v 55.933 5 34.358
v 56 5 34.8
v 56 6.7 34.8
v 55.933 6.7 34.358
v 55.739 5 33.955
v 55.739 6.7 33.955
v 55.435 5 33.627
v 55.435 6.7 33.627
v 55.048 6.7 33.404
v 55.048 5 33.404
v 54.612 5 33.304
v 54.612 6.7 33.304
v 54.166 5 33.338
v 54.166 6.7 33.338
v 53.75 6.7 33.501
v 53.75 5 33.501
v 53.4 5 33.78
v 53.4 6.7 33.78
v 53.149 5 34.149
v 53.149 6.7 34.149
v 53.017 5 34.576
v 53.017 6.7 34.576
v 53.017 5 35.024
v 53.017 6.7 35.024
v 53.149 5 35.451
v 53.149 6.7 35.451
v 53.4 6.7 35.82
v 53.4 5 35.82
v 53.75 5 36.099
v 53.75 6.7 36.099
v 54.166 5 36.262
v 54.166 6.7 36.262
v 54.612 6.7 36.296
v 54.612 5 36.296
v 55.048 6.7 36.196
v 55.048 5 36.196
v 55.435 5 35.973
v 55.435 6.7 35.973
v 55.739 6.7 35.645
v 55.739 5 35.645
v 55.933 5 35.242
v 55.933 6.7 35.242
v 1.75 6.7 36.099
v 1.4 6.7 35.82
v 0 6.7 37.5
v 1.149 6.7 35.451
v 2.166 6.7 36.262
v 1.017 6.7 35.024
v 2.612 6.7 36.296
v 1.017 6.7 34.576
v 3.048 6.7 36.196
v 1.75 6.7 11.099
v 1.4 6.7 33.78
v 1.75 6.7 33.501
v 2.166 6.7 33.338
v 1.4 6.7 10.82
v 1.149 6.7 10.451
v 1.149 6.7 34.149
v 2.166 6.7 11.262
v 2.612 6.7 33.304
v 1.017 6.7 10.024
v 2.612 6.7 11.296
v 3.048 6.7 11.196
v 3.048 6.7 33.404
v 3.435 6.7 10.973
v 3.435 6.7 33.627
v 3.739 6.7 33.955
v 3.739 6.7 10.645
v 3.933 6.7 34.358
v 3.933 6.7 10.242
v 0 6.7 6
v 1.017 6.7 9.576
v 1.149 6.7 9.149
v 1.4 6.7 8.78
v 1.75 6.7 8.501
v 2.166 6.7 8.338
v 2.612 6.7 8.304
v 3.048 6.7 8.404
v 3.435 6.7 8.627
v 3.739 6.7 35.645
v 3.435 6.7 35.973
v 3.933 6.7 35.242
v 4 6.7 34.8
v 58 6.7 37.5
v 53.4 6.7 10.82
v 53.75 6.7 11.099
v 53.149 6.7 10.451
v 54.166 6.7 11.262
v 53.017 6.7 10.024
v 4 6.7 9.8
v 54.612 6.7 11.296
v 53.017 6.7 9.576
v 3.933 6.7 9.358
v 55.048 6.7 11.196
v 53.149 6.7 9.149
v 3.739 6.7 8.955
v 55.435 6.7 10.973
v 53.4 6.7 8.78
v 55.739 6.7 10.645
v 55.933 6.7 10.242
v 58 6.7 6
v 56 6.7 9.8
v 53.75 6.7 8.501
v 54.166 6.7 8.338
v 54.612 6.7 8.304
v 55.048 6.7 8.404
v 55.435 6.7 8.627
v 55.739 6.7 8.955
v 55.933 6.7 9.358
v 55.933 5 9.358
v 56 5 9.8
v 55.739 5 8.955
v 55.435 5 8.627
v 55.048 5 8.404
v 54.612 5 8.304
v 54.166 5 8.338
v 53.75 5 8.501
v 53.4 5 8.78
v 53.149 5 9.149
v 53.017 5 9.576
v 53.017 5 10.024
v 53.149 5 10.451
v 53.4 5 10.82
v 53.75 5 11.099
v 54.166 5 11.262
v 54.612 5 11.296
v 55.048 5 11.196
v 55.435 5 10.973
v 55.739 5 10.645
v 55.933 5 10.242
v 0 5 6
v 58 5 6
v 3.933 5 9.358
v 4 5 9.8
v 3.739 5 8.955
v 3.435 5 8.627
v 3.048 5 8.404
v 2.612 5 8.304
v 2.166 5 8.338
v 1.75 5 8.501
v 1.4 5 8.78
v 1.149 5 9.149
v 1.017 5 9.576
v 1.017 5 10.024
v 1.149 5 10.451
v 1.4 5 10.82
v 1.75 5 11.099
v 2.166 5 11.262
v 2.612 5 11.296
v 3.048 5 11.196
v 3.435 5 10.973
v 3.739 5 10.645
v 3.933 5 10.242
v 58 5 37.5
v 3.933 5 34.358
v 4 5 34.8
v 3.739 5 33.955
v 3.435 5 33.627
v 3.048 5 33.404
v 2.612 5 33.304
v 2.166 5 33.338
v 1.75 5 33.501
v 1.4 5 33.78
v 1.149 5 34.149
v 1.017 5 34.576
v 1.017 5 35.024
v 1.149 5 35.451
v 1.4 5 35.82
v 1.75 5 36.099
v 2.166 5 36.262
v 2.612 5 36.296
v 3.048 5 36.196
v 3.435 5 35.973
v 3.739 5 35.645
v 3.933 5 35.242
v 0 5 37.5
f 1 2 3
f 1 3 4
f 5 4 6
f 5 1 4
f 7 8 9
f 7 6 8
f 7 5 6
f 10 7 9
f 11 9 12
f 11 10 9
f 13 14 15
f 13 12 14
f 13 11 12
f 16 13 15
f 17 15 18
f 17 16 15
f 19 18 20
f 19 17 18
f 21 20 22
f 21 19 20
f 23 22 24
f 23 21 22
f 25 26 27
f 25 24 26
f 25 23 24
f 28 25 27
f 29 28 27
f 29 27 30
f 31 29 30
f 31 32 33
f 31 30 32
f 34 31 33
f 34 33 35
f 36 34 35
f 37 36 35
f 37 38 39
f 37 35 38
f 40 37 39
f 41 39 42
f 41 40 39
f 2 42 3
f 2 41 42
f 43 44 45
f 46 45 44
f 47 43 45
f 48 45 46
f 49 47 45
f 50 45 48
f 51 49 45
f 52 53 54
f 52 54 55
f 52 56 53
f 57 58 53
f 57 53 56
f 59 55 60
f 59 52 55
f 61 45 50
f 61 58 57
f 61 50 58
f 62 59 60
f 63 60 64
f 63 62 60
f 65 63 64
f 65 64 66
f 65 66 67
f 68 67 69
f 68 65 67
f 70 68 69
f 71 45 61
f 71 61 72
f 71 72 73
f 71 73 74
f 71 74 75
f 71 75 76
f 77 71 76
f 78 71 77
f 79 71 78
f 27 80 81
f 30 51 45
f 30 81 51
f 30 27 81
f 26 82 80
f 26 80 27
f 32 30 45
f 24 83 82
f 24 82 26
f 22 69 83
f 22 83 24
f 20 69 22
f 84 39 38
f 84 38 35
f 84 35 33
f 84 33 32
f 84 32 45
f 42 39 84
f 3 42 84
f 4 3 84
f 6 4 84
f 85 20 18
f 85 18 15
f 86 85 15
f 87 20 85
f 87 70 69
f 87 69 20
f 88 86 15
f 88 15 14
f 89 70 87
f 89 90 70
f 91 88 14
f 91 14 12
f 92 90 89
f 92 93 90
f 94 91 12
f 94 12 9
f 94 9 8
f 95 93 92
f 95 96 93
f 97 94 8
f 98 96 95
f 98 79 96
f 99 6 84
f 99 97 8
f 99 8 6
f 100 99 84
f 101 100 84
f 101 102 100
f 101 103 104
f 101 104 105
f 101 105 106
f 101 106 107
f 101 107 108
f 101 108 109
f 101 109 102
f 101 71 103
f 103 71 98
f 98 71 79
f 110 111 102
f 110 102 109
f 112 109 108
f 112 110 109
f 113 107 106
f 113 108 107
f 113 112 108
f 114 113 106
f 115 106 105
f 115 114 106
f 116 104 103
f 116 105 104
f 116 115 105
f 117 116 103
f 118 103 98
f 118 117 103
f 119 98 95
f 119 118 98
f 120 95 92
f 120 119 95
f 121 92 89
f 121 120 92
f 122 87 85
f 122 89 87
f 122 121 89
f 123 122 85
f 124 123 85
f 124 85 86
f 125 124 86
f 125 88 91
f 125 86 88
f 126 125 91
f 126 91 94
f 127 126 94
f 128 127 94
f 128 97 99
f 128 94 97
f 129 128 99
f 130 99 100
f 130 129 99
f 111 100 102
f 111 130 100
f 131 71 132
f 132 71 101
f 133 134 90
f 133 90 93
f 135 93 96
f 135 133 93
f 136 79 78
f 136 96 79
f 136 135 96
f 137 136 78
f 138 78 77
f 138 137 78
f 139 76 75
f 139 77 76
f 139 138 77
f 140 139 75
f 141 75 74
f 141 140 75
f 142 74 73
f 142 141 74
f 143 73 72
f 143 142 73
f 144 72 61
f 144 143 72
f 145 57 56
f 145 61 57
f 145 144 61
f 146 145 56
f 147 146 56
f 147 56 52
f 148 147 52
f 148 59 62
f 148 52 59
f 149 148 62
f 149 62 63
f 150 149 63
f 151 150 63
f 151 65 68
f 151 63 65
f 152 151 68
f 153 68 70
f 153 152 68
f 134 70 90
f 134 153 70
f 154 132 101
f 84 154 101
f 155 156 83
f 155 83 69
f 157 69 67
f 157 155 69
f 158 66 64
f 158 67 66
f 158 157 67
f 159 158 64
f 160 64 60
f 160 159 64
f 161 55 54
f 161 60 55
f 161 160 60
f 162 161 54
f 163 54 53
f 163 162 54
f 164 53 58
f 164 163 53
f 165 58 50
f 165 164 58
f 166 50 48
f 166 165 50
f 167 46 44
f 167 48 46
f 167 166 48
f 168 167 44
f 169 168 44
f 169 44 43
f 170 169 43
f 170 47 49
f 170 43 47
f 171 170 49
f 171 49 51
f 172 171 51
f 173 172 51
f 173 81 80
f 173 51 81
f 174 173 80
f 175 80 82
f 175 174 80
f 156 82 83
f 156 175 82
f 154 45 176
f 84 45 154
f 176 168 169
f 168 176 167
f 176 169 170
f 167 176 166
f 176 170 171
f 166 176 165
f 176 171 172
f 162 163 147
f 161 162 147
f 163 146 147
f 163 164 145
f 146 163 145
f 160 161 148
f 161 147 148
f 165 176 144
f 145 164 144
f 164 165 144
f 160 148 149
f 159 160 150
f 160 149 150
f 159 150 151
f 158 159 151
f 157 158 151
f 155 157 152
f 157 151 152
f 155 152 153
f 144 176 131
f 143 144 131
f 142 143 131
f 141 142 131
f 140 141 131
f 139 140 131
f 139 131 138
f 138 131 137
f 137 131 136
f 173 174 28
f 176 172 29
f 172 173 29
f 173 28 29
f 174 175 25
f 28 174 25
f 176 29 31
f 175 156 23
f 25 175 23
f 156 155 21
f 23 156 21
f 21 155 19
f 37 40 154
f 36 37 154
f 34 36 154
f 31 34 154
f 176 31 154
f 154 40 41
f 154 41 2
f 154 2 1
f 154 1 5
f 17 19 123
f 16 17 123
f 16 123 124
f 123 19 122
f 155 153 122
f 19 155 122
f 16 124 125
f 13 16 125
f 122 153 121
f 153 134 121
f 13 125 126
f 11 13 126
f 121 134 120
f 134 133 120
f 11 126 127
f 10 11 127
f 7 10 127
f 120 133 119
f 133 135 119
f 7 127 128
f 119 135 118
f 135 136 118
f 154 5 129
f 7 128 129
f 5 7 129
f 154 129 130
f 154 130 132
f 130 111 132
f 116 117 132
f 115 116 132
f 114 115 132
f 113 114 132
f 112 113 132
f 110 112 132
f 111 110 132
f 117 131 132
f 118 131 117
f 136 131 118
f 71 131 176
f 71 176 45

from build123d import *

# Parameters (mm, degrees)
CYLINDER_R       = 1.5
CYLINDER_DEPTH   = 10
ARRAY001_X_COUNT = 2
ARRAY001_X_PITCH = 52
ARRAY001_Z_COUNT = 2
ARRAY001_Z_PITCH = 25
BOX002_W         = 58
BOX002_H         = 1.7
BOX002_DEPTH     = 31.5


with BuildPart() as hole_array_clone:
    # Cylinder → Cylinder (new body)
    with BuildSketch(Plane(origin=(0, 0, 0), x_dir=(1, 0, 0), z_dir=(0, 1, 0))):
        Circle(CYLINDER_R)
    extrude(amount=CYLINDER_DEPTH)

    # Array001 X: hole array clone ×2


with BuildPart() as hole_array_clone_1:
    add(hole_array_clone.part)
    with Locations(*[(i * ARRAY001_X_PITCH, 0, 0) for i in range(1, ARRAY001_X_COUNT)]):
        add(hole_array_clone.part)

    # Array001 Z: hole array clone ×2


with BuildPart() as hole_array_clone_2:
    add(hole_array_clone_1.part)
    with Locations(*[(0, 0, i * ARRAY001_Z_PITCH) for i in range(1, ARRAY001_Z_COUNT)]):
        add(hole_array_clone_1.part)


with BuildPart() as hole_array_clone_3:
    # Array001 placement: moved
    add(hole_array_clone_2.part.moved(Location((3, 0, 9.25))))


with BuildPart() as hole_array_clone_4:
    # Clone001 placement: moved
    add(hole_array_clone_3.part.moved(Location((-0.5, 0, 0.55))))


with BuildPart() as pcb_mockup:
    # Box002 → Box002 (new body)
    with BuildSketch(Plane(origin=(0, 5, 6), x_dir=(1, 0, 0), z_dir=(0, 0, 1))):
        with Locations((29, 0.85)):
            Rectangle(BOX002_W, BOX002_H)
    extrude(amount=BOX002_DEPTH)

    # Cut: cut hole array clone
    add(hole_array_clone_4.part, mode=Mode.SUBTRACT)


solid = pcb_mockup.part
